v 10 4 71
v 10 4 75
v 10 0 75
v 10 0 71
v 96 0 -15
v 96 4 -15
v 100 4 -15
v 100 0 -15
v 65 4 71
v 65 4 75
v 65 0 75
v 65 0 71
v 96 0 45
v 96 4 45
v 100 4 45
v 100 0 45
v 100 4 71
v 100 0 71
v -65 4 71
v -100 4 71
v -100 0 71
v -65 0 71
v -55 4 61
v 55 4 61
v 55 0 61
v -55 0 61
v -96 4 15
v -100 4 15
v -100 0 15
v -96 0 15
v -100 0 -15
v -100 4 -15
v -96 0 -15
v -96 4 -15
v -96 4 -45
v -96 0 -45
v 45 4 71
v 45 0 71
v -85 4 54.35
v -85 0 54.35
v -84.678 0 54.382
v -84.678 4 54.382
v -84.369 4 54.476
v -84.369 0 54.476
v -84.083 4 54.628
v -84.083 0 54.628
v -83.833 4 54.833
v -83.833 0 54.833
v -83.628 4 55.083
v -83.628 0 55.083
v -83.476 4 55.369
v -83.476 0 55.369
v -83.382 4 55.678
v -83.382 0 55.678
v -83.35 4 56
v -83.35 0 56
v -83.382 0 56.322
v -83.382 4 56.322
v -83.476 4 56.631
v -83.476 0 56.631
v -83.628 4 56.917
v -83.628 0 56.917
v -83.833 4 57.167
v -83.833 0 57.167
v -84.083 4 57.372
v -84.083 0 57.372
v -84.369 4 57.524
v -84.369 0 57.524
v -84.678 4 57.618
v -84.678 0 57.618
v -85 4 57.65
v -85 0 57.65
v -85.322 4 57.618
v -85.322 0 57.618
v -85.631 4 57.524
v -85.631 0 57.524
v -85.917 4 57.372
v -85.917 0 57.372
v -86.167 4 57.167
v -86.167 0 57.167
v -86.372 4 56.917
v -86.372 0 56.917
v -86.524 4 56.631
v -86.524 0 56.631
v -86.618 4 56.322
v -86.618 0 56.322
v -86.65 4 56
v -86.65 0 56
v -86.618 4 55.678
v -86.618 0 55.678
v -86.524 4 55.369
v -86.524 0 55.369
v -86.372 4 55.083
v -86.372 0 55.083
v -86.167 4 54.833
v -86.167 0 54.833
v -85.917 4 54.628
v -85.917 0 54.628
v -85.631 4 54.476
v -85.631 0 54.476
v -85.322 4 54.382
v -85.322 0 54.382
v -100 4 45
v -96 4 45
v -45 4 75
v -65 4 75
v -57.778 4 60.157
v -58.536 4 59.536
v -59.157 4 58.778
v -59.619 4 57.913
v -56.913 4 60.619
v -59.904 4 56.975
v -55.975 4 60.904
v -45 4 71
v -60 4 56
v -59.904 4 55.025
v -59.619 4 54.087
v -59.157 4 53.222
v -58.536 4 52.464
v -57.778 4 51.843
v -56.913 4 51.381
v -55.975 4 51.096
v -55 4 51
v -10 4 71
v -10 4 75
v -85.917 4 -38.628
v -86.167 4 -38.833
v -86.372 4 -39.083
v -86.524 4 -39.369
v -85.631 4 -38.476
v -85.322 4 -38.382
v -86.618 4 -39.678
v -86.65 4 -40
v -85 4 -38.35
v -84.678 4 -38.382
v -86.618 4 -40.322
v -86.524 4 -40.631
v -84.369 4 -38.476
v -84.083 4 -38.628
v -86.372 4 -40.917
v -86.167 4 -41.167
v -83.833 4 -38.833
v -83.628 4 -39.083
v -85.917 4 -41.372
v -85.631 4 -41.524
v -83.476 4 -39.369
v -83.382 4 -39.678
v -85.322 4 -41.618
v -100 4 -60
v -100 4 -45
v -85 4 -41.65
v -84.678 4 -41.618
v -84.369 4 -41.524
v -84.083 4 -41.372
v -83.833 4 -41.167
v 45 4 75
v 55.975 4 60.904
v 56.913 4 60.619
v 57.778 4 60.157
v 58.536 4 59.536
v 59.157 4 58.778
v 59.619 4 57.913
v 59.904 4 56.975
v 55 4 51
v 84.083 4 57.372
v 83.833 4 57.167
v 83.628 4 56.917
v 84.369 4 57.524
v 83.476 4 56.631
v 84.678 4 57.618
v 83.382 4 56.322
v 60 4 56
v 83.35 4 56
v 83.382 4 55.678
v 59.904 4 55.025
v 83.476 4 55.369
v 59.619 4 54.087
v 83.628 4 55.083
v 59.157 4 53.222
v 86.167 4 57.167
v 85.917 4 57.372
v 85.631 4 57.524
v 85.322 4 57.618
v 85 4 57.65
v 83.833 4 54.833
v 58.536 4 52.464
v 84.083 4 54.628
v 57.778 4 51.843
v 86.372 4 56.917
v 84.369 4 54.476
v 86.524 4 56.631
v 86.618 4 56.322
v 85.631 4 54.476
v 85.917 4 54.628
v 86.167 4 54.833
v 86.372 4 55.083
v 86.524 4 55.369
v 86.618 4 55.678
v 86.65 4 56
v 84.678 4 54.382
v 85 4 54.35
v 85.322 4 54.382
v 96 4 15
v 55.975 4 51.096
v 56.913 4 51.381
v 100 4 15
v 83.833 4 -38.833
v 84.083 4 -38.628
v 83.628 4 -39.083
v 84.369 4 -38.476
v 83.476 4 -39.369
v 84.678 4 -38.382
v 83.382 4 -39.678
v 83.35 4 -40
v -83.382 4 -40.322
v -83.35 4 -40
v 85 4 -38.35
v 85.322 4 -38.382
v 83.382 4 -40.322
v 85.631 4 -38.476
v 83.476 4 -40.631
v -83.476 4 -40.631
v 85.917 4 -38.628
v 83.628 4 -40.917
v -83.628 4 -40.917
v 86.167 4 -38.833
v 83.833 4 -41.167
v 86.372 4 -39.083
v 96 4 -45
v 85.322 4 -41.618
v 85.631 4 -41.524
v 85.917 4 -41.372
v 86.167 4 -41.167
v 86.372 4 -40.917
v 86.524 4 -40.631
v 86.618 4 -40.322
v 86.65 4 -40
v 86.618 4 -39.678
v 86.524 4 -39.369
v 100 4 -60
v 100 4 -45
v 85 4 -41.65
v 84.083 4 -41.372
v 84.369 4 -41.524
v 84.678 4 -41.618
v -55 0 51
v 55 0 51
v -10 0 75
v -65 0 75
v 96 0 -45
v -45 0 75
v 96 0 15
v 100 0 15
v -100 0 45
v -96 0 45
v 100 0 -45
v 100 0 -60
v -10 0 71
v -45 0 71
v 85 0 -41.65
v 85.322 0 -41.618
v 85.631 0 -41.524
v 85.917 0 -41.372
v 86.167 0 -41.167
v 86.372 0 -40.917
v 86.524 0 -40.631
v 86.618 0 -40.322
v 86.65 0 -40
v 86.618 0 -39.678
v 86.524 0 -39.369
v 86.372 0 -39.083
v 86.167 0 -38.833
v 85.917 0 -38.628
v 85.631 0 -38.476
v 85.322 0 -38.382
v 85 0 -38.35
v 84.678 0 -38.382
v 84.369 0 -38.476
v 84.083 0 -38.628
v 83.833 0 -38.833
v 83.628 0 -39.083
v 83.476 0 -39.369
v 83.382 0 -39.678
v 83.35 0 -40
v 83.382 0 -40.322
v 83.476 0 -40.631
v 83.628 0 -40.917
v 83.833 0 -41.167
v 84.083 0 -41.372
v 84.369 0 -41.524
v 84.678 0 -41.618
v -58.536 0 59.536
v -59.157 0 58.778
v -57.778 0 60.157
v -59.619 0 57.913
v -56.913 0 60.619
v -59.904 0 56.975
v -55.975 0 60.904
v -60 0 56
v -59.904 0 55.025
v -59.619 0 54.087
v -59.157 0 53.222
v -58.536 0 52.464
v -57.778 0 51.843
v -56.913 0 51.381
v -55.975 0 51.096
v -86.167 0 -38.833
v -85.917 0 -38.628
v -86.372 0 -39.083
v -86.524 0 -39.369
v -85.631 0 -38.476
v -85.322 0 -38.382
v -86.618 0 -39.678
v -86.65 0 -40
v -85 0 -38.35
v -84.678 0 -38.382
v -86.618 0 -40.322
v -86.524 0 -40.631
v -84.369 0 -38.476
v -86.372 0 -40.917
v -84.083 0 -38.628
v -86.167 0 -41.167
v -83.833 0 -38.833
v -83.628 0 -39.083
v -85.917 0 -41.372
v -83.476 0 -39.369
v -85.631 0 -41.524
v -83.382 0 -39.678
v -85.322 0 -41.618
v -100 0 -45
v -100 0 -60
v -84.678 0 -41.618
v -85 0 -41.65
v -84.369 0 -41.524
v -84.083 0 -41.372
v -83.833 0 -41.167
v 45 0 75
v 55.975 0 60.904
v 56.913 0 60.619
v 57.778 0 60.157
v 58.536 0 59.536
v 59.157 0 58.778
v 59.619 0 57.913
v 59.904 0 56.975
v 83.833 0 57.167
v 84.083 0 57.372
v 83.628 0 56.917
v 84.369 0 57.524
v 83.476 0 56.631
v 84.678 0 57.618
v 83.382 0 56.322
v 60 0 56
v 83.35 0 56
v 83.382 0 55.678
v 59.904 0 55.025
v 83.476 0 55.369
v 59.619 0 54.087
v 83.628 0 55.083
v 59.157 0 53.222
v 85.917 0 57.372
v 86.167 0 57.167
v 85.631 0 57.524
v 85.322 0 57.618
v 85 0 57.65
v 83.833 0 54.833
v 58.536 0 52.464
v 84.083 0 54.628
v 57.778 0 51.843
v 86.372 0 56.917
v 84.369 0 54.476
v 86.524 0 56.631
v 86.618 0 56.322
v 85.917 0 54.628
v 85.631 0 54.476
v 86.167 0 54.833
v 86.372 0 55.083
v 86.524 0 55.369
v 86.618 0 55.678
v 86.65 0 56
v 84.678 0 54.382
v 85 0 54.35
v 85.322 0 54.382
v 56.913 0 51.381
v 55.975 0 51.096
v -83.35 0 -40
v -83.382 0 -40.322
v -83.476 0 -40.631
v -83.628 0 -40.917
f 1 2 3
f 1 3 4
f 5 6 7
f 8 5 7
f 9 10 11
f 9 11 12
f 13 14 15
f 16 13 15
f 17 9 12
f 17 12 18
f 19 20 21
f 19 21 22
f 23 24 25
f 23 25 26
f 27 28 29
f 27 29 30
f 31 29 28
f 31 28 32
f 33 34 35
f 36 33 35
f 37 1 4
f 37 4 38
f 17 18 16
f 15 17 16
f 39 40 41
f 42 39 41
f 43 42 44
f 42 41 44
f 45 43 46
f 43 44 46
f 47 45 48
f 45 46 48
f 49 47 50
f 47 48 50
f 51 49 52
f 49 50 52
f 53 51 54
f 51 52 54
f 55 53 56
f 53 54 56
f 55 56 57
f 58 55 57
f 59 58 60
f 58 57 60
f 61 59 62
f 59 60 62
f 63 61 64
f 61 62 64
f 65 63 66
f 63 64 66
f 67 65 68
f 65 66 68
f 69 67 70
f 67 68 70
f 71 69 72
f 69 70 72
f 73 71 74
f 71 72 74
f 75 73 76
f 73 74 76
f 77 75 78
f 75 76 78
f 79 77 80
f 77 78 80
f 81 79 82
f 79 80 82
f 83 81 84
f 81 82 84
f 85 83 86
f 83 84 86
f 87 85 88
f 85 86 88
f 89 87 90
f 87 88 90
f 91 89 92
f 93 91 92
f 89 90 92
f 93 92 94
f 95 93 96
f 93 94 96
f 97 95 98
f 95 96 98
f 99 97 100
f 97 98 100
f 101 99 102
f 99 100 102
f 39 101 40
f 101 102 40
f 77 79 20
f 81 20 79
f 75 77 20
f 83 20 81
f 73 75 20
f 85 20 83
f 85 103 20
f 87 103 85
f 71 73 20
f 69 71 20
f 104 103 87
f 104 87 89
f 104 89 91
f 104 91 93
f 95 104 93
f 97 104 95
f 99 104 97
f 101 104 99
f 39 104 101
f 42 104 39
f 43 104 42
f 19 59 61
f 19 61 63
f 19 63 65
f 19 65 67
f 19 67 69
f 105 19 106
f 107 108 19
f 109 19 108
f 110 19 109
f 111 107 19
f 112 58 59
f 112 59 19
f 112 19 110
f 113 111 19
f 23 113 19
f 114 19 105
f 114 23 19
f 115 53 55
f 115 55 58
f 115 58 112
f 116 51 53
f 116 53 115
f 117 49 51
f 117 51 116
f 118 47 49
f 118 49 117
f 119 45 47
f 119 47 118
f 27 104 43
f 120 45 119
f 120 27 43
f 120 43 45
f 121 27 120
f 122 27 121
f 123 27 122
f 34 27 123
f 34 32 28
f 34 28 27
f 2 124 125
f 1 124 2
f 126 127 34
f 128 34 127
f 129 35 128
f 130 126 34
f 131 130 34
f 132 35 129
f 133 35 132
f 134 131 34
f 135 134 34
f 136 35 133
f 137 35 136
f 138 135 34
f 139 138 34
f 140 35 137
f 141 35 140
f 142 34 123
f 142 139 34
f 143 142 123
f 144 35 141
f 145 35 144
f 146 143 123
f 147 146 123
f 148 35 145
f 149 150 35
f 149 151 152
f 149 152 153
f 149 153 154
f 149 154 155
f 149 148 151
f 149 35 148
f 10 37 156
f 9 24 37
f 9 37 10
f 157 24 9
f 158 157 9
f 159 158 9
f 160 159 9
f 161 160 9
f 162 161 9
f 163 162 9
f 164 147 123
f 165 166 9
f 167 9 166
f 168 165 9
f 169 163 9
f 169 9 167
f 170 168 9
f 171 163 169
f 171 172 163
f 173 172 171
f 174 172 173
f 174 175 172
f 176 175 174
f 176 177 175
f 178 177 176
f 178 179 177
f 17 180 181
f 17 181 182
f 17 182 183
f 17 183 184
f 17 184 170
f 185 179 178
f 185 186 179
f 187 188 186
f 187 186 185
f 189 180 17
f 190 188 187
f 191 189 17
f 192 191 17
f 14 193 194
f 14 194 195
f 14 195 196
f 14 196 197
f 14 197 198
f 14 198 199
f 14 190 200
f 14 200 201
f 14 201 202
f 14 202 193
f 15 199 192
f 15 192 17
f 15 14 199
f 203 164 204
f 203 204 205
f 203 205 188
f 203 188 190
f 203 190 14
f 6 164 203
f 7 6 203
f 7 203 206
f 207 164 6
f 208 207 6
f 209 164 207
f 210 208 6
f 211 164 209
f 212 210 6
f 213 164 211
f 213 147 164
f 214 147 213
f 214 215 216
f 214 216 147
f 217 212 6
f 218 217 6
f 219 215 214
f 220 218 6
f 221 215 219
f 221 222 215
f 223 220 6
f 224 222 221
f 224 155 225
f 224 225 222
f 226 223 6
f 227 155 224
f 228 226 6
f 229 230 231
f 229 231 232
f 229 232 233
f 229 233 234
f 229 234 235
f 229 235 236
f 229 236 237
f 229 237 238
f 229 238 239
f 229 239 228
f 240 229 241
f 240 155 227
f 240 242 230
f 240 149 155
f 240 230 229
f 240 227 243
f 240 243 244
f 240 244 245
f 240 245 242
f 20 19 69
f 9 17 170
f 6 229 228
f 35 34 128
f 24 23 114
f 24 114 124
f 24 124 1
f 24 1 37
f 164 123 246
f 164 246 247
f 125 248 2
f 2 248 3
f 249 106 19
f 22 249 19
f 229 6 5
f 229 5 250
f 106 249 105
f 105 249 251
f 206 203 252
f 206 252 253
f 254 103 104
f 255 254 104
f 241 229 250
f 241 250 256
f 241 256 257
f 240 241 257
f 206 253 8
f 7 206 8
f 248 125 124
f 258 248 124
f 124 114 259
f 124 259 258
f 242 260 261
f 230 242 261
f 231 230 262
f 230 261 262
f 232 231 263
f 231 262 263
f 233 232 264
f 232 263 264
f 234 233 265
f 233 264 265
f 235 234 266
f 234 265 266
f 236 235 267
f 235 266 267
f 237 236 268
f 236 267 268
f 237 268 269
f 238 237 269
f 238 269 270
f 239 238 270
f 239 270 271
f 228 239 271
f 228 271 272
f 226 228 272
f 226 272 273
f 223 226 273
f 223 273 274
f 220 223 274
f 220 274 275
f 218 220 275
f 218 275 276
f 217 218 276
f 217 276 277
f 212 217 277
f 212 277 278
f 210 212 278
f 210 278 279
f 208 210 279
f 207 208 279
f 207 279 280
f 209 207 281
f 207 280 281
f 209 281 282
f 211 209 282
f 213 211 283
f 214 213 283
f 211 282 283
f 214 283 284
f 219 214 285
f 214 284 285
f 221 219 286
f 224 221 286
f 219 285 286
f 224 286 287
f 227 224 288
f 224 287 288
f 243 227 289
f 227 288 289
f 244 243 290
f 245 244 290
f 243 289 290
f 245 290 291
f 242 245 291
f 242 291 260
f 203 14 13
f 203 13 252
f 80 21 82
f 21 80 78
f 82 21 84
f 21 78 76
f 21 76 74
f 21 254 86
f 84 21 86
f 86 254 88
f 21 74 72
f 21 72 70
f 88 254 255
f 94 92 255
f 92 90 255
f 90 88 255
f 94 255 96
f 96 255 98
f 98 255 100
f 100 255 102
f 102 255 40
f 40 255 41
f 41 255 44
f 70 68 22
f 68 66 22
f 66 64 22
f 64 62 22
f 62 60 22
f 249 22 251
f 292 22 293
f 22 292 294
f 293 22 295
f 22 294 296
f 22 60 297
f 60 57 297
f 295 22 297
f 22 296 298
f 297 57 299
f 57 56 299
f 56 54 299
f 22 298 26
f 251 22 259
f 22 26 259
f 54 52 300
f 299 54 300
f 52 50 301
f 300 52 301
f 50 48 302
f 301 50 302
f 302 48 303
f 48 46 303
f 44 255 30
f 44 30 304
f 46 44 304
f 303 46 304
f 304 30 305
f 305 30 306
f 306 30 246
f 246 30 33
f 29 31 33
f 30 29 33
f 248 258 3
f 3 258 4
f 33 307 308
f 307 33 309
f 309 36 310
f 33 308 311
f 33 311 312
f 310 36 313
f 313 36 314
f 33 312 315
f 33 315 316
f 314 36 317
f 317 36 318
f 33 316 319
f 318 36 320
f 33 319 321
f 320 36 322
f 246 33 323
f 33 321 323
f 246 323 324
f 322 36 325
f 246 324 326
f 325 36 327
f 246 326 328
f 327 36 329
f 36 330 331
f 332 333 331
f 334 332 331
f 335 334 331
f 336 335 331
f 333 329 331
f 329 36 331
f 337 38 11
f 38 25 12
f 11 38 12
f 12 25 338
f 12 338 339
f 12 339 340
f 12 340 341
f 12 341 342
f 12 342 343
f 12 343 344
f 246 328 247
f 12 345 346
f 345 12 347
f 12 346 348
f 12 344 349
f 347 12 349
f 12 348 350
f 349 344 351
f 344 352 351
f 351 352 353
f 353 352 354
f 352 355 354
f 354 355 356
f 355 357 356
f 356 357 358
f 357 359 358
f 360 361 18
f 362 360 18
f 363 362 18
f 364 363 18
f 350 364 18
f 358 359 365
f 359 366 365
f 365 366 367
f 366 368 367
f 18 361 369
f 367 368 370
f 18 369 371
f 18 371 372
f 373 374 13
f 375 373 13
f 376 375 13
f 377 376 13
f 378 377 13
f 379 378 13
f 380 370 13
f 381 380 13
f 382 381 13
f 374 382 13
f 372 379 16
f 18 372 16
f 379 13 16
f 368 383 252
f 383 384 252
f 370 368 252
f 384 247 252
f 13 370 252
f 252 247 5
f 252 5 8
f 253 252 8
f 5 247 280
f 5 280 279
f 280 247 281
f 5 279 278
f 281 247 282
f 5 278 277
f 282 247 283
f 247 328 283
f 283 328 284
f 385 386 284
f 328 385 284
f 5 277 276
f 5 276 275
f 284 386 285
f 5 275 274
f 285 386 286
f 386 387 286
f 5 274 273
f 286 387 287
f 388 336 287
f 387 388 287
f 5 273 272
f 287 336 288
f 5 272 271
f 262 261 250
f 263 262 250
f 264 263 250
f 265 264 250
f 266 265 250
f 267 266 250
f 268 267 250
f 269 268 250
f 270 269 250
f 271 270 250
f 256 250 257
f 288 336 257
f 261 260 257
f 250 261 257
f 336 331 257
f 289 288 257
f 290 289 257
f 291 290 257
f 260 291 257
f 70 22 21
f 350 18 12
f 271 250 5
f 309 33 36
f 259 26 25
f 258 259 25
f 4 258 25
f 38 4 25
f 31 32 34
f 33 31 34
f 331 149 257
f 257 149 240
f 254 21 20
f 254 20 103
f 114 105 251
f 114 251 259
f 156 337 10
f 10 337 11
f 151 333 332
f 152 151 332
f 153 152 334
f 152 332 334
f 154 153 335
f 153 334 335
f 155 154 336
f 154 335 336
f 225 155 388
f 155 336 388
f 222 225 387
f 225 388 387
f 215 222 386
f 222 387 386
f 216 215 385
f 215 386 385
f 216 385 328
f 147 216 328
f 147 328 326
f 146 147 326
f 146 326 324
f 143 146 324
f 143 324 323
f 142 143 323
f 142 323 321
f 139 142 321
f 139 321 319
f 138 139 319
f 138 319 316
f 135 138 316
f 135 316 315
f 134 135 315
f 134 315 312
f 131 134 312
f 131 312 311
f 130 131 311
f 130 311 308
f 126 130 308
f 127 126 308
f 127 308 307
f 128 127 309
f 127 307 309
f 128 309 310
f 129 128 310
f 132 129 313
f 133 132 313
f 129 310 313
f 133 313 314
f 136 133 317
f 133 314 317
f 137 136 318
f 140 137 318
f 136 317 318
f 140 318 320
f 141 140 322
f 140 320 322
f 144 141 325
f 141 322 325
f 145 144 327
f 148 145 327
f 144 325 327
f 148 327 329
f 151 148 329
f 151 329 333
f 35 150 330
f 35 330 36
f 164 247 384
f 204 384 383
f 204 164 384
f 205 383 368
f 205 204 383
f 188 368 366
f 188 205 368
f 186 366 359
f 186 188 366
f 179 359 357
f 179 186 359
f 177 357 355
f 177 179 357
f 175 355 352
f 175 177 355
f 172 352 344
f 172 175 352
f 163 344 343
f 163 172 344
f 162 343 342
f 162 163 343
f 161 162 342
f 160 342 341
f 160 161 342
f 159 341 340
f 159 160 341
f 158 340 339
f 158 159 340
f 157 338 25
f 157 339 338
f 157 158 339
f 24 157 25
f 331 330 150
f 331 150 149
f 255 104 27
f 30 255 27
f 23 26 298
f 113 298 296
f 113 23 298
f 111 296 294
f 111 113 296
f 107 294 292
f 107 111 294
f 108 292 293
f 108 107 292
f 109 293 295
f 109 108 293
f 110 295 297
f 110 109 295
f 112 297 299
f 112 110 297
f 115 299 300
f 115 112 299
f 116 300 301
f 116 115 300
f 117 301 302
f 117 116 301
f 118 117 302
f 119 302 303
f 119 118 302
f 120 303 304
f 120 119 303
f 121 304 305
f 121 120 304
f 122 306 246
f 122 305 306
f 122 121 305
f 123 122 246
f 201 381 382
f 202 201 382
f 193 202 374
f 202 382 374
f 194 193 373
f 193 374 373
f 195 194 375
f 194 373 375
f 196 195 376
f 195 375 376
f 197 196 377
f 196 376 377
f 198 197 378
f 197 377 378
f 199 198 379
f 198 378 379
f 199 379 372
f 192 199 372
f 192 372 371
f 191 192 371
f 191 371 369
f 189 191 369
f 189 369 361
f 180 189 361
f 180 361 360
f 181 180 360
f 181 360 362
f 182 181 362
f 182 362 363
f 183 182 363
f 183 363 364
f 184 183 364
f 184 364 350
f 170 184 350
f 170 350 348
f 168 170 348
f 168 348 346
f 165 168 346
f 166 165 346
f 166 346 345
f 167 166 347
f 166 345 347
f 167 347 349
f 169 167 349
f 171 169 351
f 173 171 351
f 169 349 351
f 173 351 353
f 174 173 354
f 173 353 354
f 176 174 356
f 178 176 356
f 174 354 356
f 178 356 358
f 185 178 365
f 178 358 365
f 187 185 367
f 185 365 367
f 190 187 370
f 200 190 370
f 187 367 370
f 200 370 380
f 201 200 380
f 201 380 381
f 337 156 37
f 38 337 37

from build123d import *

# Parameters (mm, degrees)
ESBO_O1_W                               = 200
ESBO_O1_H                               = 150
RESSALTO_EXTRUS_O1_DEPTH                = 4
ESBO_O2_W                               = 35
ESBO_O2_H                               = 4
ESBO_O2_W_2                             = 4
ESBO_O2_H_2                             = 30
CORTE_EXTRUS_O1_DEPTH                   = 5
ESBO_O3_W                               = 200
ESBO_O3_H                               = 15
CORTE_EXTRUS_O2_DEPTH                   = 5
BROCA_DE_ROSQUEAR_PARA_TARRAXA_DE_M41_D = 3.3
ESBO_O5_R                               = 1.65
CORTE_EXTRUS_O3_DEPTH                   = 5


with BuildPart() as part:
    # Esboço1 → Ressalto-extrusão1 (new body)
    with BuildSketch(Plane(origin=(0, 0, 0), x_dir=(1, 0, 0), z_dir=(0, 1, 0))):
        Rectangle(ESBO_O1_W, ESBO_O1_H)
    extrude(amount=RESSALTO_EXTRUS_O1_DEPTH)

    # Esboço2 → Corte-extrusão1 (cut, through all)
    with BuildSketch(Plane(origin=(0, 4, 0), x_dir=(1, 0, 0), z_dir=(0, 1, 0))):
        with Locations((-27.5, -73)):
            Rectangle(ESBO_O2_W, ESBO_O2_H)
        with Locations((27.5, -73)):
            Rectangle(ESBO_O2_W, ESBO_O2_H)
        with Locations((82.5, -73)):
            Rectangle(ESBO_O2_W, ESBO_O2_H)
        with Locations((-82.5, -73)):
            Rectangle(ESBO_O2_W, ESBO_O2_H)
        with Locations((98, 30)):
            Rectangle(ESBO_O2_W_2, ESBO_O2_H_2)
        with Locations((98, -30)):
            Rectangle(ESBO_O2_W_2, ESBO_O2_H_2)
        with Locations((-98, 30)):
            Rectangle(ESBO_O2_W_2, ESBO_O2_H_2)
        with Locations((-98, -30)):
            Rectangle(ESBO_O2_W_2, ESBO_O2_H_2)
    extrude(amount=-CORTE_EXTRUS_O1_DEPTH, mode=Mode.SUBTRACT)

    # Esboço3 → Corte-extrusão2 (cut, through all)
    with BuildSketch(Plane(origin=(0, 4, 0), x_dir=(1, 0, 0), z_dir=(0, 1, 0))):
        with Locations((0, 67.5)):
            Rectangle(ESBO_O3_W, ESBO_O3_H)
    extrude(amount=-CORTE_EXTRUS_O2_DEPTH, mode=Mode.SUBTRACT)

    # Broca de rosquear para tarraxa de M41 (through all)
    with Locations(Plane(origin=(-85, 4, -40), x_dir=(0, 0, 1), z_dir=(0, 1, 0))):
        with Locations((0, 0), (96, 0), (96, 170), (0, 170)):
            Hole(BROCA_DE_ROSQUEAR_PARA_TARRAXA_DE_M41_D / 2)

    # Esboço5 → Corte-extrusão3 (cut, through all)
    with BuildSketch(Plane(origin=(0, 4, 0), x_dir=(1, 0, 0), z_dir=(0, 1, 0))):
        with Locations((-85, -56)):
            Circle(ESBO_O5_R)
        with BuildLine():
            Line((55, -61), (-55, -61))
            ThreePointArc((-55, -61), (-60, -56), (-55, -51))
            Line((-55, -51), (55, -51))
            ThreePointArc((55, -51), (60, -56), (55, -61))
        make_face()
    extrude(amount=-CORTE_EXTRUS_O3_DEPTH, mode=Mode.SUBTRACT)


solid = part.part
